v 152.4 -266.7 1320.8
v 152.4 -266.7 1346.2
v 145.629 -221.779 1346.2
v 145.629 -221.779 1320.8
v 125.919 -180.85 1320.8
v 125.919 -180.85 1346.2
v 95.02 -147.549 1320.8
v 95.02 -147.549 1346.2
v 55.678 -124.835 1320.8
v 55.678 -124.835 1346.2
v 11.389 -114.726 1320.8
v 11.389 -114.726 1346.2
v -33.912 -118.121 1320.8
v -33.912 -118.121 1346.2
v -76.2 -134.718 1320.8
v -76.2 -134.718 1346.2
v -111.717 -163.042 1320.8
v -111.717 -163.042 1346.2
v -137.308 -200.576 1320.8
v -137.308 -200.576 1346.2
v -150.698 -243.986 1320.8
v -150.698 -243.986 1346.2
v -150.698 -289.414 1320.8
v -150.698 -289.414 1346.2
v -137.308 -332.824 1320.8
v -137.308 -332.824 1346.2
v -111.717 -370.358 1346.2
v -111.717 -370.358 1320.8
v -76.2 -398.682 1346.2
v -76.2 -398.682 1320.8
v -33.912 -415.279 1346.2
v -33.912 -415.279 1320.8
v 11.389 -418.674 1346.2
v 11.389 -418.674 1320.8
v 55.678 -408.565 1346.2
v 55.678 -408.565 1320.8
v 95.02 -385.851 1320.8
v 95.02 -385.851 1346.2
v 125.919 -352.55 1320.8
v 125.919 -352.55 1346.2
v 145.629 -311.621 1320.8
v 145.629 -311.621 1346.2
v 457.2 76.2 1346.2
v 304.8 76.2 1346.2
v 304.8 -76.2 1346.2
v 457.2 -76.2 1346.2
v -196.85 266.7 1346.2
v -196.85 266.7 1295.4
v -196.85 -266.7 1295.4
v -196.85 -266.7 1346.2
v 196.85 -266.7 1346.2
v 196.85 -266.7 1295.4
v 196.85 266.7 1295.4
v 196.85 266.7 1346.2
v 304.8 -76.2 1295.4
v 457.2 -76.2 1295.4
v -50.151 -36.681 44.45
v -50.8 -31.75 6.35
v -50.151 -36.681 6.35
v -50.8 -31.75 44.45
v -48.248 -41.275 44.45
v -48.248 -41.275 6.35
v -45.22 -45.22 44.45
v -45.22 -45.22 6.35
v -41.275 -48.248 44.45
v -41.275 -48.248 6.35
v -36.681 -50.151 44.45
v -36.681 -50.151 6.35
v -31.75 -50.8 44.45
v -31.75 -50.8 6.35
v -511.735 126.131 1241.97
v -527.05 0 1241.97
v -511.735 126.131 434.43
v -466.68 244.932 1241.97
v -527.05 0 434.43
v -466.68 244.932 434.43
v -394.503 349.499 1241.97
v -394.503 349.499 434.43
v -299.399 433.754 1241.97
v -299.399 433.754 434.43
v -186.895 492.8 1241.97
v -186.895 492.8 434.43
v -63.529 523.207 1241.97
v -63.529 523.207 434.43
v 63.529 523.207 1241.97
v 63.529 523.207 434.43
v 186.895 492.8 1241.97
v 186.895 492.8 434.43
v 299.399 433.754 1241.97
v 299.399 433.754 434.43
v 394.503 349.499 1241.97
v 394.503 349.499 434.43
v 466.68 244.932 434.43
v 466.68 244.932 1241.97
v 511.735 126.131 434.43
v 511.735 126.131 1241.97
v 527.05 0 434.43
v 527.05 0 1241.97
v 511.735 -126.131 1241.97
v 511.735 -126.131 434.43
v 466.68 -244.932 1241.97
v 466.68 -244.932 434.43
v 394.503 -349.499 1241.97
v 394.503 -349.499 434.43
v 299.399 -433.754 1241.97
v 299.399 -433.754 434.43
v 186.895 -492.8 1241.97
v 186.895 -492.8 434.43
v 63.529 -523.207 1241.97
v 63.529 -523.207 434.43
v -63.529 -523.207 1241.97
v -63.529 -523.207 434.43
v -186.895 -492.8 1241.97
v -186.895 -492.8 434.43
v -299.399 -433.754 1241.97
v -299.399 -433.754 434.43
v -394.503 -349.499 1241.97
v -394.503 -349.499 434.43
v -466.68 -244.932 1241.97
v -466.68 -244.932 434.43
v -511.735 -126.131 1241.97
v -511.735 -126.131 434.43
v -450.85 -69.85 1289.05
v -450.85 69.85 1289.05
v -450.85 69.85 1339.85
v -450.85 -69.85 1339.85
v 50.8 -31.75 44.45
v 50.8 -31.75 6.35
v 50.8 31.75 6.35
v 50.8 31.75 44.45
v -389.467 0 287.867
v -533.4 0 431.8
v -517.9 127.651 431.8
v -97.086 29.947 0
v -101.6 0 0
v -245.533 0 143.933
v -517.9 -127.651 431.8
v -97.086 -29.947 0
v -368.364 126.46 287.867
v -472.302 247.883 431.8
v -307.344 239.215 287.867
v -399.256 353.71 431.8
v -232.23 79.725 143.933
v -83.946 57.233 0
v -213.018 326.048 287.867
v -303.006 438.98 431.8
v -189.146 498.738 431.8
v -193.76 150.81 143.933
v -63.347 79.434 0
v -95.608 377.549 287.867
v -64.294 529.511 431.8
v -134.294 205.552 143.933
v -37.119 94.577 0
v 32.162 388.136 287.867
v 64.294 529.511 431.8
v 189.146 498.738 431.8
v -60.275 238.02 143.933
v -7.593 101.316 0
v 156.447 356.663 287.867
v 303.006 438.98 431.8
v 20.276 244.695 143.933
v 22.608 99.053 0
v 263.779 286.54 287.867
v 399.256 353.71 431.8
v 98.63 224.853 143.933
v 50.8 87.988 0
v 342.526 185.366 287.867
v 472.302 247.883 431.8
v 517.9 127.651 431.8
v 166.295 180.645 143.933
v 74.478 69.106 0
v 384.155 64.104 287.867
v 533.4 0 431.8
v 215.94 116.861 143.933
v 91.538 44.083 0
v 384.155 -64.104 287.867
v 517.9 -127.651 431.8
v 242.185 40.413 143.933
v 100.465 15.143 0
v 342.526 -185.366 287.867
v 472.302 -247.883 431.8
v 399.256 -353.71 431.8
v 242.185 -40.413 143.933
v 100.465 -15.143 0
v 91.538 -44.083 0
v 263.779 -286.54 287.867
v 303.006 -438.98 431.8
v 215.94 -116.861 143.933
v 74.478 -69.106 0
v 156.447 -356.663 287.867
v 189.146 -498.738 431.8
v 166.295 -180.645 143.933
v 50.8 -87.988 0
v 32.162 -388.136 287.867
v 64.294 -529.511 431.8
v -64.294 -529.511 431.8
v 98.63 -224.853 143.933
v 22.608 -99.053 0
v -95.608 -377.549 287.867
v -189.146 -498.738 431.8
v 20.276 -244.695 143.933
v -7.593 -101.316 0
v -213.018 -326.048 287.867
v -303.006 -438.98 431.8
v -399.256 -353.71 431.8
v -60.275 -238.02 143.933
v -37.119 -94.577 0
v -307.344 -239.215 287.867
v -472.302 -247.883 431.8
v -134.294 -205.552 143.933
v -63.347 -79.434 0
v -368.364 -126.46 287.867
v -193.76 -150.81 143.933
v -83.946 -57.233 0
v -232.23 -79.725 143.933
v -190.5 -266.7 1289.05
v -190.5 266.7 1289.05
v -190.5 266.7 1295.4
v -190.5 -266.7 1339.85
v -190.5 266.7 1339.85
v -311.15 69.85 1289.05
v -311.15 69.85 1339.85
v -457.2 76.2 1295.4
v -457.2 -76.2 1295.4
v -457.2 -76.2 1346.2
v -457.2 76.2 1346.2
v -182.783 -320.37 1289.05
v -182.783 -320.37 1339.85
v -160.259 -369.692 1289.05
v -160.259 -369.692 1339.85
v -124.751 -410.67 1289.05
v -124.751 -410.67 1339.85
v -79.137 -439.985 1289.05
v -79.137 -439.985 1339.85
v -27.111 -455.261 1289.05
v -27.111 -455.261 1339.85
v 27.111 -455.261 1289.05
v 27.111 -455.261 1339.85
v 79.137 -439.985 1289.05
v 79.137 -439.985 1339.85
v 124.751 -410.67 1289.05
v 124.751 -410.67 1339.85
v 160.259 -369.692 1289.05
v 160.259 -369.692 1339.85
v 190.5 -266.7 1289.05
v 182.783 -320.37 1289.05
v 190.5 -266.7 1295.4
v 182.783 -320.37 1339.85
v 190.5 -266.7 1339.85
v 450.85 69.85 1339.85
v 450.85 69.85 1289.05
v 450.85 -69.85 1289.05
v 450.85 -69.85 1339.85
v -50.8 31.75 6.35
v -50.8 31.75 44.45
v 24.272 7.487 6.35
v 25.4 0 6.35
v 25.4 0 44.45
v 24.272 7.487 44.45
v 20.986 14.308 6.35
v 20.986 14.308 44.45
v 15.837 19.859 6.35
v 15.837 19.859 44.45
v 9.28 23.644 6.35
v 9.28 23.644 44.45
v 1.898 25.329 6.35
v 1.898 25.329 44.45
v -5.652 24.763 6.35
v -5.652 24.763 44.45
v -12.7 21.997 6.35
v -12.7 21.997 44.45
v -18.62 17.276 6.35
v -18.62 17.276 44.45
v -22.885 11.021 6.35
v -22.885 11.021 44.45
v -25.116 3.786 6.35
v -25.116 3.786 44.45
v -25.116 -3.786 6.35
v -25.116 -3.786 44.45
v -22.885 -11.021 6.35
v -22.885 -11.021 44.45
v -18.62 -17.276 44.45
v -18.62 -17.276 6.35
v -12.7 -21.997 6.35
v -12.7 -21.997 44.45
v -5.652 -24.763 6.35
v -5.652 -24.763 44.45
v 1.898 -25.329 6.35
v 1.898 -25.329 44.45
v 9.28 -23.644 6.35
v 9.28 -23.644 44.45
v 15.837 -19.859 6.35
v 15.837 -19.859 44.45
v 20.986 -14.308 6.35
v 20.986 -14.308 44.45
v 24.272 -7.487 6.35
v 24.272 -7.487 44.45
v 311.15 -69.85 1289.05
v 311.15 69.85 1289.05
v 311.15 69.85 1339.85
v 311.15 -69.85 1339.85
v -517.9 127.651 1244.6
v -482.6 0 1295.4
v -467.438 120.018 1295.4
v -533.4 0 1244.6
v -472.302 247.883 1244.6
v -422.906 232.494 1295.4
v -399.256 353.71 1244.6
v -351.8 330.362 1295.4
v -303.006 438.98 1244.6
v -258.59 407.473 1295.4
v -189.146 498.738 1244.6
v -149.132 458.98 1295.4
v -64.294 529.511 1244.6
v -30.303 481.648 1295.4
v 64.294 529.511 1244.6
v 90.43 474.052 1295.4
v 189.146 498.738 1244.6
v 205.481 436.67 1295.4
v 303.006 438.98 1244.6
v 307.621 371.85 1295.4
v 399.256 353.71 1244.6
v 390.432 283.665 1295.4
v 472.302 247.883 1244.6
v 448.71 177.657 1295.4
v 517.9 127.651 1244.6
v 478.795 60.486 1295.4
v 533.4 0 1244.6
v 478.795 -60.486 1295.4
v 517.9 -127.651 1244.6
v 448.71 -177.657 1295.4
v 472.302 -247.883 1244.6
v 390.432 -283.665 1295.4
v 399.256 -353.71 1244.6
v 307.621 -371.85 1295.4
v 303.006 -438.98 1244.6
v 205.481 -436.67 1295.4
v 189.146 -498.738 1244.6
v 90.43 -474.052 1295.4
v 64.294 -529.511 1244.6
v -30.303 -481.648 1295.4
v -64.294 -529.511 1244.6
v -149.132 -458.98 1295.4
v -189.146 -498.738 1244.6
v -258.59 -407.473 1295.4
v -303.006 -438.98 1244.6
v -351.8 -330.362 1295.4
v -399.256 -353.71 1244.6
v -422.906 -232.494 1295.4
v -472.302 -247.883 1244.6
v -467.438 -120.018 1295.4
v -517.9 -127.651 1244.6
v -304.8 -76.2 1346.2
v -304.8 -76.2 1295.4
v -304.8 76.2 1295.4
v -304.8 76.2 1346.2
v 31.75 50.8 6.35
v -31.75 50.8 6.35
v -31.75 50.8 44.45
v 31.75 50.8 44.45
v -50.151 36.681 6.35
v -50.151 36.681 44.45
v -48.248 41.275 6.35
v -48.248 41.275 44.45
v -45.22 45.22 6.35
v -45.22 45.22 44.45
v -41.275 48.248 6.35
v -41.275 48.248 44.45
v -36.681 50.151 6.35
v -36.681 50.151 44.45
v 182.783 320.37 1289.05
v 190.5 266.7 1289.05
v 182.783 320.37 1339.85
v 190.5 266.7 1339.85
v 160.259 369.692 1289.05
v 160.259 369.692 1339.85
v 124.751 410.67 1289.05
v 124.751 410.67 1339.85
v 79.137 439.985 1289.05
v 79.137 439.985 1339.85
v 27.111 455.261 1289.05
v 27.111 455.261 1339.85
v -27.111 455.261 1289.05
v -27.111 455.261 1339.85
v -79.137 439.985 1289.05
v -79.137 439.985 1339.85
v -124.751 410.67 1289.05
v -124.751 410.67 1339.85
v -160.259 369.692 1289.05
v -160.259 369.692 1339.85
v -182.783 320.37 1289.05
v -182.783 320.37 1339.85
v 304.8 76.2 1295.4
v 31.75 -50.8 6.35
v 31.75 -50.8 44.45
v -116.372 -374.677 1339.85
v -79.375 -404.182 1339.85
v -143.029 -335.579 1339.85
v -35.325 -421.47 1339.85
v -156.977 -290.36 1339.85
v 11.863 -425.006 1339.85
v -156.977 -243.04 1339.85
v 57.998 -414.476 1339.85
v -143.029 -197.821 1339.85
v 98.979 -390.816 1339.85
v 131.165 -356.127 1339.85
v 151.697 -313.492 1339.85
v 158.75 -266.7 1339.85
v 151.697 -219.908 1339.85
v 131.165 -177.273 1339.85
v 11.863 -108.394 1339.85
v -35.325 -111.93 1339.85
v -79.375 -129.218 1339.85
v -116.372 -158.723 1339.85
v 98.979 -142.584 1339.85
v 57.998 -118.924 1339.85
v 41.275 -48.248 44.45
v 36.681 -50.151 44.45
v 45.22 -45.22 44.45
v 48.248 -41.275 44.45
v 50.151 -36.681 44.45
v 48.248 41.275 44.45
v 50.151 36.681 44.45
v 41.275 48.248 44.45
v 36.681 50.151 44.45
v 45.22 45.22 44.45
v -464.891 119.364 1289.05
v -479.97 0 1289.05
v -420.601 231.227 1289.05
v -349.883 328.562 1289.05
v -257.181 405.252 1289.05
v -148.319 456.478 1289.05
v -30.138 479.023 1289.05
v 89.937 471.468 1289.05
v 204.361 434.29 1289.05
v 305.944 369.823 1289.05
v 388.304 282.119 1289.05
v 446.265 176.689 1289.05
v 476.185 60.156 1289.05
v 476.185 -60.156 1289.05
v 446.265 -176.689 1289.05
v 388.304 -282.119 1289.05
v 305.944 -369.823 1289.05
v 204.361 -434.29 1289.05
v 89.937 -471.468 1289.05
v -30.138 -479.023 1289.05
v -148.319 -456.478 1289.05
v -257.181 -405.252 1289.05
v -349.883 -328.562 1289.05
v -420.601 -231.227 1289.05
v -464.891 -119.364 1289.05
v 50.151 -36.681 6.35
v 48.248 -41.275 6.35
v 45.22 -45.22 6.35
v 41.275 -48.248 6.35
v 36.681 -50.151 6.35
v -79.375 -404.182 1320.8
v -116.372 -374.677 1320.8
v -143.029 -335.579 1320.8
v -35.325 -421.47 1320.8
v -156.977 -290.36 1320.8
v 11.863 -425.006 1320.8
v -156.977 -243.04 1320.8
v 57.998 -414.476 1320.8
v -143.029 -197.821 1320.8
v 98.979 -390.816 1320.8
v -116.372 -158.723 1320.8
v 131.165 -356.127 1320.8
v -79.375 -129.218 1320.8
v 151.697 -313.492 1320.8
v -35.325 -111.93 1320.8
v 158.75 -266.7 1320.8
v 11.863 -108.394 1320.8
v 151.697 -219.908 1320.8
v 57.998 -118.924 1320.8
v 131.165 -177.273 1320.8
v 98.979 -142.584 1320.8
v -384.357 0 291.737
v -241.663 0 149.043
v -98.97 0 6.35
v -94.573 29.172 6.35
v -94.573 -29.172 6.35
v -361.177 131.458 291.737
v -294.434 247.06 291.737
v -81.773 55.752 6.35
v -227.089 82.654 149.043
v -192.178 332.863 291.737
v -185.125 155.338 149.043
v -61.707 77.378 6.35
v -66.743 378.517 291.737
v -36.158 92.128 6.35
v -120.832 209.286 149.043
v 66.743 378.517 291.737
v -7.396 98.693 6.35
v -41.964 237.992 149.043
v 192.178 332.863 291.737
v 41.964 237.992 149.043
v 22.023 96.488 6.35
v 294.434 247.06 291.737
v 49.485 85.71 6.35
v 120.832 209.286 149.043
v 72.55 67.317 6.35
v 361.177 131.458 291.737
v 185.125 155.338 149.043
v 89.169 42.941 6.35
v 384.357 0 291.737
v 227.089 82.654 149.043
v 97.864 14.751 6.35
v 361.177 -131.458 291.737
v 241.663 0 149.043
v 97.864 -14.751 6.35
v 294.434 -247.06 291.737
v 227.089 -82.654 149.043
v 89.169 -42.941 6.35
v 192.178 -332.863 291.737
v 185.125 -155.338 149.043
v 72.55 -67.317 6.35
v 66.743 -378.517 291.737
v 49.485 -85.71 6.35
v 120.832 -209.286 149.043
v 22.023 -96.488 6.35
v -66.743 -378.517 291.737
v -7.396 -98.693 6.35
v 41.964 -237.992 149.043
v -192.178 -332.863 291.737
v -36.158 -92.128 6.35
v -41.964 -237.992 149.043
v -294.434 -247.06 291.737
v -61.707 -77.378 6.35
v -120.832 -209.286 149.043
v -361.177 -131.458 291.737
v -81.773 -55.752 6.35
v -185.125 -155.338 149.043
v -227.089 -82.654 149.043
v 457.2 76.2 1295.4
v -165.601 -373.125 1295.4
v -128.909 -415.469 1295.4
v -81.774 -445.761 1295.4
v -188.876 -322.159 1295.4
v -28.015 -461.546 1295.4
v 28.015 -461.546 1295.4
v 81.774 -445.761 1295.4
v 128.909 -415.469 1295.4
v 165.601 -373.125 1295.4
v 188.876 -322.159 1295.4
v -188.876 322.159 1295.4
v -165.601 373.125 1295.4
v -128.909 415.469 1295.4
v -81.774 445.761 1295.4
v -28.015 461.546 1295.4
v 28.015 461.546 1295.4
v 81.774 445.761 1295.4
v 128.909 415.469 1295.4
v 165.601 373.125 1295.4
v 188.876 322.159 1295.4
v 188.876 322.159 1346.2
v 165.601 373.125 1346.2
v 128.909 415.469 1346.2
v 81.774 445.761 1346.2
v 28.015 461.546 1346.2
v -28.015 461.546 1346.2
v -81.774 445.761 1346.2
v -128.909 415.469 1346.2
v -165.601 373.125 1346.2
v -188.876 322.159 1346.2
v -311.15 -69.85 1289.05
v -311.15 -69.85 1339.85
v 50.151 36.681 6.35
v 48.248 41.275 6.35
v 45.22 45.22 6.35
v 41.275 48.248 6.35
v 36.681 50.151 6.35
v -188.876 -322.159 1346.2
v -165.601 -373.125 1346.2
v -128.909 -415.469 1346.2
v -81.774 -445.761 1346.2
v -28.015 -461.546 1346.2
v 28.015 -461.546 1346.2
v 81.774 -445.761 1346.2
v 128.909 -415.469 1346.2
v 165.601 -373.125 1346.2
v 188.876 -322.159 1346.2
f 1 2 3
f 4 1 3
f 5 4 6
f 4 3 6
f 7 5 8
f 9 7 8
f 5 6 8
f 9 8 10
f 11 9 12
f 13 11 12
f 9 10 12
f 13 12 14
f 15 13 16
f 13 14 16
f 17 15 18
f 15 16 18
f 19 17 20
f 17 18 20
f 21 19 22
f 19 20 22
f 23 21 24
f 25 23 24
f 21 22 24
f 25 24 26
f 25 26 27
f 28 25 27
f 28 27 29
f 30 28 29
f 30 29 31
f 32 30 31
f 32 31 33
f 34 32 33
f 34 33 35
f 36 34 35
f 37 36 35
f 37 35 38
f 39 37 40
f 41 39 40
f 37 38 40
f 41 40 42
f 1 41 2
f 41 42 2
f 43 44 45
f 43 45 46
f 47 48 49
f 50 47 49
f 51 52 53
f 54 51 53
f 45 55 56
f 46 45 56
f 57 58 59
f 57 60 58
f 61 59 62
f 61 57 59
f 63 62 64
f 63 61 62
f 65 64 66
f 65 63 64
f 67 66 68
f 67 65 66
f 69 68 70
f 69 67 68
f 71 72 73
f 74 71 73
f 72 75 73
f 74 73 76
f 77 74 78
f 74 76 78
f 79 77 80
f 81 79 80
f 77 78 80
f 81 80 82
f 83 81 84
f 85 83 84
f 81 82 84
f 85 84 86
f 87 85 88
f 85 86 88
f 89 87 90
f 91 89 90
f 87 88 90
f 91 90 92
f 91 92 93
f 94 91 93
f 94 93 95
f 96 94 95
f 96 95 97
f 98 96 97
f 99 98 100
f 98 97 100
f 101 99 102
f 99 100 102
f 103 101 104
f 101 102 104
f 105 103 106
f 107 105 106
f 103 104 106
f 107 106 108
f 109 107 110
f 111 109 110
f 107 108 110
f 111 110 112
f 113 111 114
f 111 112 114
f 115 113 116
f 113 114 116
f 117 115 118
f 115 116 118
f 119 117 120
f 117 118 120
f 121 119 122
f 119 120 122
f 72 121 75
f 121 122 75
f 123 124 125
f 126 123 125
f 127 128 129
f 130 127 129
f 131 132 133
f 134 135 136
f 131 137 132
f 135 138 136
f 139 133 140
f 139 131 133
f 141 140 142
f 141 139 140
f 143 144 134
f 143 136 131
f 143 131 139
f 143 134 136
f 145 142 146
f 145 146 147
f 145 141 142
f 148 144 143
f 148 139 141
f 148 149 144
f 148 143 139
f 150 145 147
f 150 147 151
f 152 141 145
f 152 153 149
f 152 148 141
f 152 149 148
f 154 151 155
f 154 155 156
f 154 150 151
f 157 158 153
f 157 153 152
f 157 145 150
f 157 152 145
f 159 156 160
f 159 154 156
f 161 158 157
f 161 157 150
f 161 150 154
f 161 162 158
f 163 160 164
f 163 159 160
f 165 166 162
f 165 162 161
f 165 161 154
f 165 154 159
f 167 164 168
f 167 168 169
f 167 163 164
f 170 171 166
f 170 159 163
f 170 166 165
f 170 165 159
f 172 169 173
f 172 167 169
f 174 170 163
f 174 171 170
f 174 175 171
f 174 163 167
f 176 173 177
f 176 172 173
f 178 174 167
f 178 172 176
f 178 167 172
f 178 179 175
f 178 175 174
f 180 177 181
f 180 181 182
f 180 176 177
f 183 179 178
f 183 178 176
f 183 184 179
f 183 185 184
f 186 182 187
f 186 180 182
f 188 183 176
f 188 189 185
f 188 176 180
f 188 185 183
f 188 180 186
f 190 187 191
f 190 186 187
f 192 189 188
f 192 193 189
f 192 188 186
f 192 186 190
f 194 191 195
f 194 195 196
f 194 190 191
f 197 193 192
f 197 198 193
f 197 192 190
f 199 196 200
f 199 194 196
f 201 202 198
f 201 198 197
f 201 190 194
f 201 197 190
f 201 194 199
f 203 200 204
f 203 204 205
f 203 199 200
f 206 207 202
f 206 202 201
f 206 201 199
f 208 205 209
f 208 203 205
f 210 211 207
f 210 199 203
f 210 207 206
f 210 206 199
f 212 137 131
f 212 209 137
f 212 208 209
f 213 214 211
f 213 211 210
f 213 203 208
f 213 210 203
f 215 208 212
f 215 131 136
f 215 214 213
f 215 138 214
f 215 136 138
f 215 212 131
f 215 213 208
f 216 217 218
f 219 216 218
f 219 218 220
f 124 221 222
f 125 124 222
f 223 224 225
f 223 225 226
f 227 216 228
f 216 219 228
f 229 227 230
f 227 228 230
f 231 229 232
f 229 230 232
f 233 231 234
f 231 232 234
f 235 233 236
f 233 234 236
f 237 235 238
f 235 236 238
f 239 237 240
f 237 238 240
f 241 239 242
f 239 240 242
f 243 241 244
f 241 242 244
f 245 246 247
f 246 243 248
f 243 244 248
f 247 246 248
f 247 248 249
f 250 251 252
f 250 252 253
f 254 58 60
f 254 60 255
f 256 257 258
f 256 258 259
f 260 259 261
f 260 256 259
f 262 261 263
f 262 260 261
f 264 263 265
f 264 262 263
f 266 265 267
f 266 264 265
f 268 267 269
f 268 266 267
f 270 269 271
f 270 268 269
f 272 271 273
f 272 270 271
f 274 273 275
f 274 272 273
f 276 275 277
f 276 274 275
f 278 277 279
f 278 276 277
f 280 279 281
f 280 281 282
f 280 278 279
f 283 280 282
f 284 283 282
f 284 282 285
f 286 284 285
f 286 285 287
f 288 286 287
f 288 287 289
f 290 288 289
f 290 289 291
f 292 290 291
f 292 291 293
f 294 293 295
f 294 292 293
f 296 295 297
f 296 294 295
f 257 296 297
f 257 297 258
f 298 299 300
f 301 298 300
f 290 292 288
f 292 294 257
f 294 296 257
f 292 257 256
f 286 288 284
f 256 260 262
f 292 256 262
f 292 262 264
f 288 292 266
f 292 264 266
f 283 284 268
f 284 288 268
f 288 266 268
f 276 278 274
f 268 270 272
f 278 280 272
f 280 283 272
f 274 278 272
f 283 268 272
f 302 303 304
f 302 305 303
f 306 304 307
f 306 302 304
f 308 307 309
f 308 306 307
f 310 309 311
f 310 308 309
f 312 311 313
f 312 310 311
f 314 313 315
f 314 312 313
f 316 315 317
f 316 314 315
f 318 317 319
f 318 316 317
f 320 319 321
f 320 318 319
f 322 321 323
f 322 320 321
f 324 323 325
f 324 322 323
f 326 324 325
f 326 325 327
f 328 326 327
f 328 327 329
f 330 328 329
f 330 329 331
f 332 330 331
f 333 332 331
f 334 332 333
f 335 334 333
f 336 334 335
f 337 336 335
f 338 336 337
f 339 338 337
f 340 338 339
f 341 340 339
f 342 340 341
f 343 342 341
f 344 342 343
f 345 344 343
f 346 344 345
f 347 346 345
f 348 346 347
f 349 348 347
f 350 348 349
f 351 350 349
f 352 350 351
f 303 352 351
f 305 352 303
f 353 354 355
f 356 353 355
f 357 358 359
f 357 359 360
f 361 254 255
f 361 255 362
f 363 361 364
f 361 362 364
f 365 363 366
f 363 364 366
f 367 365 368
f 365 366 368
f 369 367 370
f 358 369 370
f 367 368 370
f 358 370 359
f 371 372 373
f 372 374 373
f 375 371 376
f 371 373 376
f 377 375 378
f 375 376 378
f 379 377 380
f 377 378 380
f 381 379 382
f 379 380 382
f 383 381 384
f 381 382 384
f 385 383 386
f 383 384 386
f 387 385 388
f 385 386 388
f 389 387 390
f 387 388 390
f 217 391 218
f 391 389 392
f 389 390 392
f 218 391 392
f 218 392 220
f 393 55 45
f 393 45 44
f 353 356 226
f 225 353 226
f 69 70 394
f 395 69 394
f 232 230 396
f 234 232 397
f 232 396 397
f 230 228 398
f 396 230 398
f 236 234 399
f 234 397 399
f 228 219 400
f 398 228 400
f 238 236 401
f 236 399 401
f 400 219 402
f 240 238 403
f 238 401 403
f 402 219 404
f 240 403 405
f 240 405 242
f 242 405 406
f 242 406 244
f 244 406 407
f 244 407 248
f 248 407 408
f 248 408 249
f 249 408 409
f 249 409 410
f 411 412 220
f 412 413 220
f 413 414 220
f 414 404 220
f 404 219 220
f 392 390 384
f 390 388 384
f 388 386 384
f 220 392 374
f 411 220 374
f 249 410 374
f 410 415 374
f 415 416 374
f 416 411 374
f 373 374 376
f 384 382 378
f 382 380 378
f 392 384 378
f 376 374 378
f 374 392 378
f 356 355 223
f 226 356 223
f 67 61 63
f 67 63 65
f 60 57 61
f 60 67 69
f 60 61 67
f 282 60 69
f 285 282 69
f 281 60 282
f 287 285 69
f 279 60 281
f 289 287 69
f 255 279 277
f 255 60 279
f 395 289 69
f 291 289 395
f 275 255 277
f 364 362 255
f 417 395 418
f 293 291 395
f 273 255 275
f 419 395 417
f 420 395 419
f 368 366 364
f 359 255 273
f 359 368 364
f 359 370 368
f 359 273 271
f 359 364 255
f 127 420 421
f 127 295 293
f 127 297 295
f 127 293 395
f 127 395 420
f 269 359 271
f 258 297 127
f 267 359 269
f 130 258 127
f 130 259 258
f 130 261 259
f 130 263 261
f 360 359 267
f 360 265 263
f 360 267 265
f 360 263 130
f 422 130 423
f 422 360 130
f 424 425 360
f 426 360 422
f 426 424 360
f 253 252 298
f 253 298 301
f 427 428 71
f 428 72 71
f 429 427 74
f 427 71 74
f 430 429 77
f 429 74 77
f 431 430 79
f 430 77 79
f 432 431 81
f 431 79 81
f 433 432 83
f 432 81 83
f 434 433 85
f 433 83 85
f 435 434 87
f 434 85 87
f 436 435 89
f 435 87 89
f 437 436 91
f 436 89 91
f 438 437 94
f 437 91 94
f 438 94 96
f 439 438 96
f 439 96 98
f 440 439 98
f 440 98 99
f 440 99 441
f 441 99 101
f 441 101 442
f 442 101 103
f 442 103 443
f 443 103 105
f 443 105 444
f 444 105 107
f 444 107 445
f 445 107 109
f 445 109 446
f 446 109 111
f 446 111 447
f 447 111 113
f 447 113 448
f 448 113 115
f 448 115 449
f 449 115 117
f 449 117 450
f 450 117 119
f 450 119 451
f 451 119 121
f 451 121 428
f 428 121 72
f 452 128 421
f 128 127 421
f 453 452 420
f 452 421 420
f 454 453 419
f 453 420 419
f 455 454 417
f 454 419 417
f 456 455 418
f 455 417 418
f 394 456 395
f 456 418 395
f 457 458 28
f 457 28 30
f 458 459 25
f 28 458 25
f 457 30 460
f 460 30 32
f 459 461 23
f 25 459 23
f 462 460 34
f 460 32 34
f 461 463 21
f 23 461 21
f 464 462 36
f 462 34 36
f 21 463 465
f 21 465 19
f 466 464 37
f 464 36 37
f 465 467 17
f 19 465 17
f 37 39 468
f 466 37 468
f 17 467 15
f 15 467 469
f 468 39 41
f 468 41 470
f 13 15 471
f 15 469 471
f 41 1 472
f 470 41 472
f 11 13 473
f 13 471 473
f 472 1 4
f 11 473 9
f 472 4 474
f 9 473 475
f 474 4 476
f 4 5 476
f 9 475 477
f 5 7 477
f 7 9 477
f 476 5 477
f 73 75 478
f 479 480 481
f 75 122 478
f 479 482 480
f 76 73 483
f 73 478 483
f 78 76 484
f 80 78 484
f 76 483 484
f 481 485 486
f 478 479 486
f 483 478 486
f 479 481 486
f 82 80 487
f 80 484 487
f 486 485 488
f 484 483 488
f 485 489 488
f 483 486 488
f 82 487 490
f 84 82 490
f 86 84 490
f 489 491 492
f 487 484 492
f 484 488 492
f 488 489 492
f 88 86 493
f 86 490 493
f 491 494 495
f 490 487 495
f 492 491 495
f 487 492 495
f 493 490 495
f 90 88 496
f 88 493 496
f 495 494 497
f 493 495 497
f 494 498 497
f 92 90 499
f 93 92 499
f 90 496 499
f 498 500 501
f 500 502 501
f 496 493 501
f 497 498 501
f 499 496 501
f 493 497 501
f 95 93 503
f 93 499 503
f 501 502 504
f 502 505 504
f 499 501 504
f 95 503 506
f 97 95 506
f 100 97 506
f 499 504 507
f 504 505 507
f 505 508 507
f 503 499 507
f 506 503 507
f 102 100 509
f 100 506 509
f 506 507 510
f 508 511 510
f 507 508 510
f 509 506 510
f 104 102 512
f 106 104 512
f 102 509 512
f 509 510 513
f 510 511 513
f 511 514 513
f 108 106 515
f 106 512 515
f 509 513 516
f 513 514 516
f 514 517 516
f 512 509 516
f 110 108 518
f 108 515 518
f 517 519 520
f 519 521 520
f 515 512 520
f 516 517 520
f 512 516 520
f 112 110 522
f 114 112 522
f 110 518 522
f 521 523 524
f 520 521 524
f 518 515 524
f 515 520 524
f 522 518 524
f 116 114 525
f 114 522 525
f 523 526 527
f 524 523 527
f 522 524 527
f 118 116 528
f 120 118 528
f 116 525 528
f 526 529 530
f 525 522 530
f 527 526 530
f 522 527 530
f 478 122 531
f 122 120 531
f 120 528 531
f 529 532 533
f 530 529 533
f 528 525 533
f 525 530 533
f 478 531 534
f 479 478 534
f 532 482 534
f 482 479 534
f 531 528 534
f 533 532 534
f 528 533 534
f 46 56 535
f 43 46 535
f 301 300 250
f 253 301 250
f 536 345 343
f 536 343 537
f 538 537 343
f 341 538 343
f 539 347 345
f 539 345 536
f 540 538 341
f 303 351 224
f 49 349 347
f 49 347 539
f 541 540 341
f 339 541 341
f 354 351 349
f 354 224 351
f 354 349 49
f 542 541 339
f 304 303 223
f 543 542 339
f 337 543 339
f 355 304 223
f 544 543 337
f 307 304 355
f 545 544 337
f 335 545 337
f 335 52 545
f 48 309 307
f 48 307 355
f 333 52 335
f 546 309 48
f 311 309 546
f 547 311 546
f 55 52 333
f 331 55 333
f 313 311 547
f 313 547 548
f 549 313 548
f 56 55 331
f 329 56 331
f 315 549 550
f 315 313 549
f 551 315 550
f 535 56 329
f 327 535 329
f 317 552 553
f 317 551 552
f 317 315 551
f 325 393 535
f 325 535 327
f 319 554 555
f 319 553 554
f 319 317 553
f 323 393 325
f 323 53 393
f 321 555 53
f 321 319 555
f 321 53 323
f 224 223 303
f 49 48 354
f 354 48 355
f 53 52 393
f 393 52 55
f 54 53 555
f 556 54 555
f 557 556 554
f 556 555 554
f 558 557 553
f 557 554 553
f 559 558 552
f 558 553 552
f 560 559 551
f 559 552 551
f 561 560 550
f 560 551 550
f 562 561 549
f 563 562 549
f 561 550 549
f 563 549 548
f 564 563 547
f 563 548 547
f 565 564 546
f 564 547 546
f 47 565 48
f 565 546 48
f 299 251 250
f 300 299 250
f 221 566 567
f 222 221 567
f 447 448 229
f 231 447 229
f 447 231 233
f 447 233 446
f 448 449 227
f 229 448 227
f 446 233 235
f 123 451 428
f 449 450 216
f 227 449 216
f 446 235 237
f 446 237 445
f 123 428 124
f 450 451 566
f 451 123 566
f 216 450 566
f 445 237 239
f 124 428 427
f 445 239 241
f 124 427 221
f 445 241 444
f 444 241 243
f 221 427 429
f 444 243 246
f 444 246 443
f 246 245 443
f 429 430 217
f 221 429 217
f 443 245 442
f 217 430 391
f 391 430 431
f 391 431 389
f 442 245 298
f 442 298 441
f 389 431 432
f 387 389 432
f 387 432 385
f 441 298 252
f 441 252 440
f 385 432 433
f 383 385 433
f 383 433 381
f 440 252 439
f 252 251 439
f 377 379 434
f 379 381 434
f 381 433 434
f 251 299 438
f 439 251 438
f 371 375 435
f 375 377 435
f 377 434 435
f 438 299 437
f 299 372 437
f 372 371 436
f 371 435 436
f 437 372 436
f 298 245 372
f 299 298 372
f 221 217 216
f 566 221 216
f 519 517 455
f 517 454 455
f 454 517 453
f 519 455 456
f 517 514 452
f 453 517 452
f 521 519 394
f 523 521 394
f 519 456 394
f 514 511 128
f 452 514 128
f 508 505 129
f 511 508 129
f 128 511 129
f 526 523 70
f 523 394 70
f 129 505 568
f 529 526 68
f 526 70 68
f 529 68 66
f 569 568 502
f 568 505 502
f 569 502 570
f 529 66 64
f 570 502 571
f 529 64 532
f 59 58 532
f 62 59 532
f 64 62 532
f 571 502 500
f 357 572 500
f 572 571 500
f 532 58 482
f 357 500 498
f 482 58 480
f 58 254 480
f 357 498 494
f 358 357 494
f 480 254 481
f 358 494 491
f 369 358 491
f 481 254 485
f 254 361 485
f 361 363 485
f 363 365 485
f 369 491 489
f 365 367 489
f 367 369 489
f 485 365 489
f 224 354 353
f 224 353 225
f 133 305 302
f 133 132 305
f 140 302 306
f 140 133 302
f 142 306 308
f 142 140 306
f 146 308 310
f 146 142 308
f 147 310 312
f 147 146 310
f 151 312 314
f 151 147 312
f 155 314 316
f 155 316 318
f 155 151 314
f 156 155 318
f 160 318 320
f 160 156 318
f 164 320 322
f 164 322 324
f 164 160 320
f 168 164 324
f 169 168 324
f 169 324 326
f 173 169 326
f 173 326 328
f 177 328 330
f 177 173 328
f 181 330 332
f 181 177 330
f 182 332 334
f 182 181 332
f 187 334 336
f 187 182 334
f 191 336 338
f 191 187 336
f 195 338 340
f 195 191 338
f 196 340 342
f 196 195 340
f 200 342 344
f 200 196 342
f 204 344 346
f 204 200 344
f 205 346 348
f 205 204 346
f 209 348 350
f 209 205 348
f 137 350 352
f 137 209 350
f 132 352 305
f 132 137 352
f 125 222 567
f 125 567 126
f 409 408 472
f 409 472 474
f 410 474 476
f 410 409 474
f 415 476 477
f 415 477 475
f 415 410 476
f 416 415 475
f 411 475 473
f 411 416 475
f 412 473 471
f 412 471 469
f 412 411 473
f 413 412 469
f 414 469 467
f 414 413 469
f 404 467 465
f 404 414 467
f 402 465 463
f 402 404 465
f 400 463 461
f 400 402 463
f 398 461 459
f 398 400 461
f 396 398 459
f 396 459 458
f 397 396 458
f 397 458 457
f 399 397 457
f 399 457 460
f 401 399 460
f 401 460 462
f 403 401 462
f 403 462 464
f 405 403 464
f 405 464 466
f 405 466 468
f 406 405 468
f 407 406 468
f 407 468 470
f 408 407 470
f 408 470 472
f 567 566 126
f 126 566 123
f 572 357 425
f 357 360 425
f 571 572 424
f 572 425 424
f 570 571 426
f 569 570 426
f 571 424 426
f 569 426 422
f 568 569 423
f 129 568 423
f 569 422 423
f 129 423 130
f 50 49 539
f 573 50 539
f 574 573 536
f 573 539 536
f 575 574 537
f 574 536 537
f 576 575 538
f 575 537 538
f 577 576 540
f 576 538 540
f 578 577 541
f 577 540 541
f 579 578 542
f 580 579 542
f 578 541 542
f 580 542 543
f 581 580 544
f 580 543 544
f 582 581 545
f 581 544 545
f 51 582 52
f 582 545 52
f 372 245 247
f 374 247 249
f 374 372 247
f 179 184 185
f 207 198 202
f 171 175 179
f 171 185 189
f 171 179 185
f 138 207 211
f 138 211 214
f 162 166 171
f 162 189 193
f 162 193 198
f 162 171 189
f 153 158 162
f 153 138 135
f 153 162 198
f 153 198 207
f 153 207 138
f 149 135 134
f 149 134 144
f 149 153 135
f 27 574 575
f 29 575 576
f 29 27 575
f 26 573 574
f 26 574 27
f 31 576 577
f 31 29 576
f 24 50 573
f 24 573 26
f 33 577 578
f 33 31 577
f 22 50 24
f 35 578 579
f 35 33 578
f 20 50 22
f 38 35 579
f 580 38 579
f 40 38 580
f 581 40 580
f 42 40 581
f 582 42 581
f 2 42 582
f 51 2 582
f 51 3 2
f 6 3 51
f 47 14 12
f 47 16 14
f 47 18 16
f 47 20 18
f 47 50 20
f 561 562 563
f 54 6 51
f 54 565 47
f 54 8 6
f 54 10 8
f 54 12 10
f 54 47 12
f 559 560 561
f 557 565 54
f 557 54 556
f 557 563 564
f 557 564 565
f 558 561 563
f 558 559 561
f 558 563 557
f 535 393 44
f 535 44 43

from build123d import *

# Parameters (mm, degrees)
F2_W         = 152.4
F2_H         = 152.4
F3_DEPTH     = 50.8
F5_DEPTH     = 50.8
F6_R         = 152.4
F7_DEPTH     = 25.4
F8_T         = 6.35
F8_T3_DEPTH  = 165.1
F8_T5_DEPTH  = 165.1
F8_T7_DEPTH  = 546.1
F8_T9_DEPTH  = 165.1
F8_T12_ANGLE = 180.000000001
F8_T14_ANGLE = 180.000000001
F9_W         = 101.6
F9_H         = 101.6
F9_R         = 25.4
F10_DEPTH    = 38.1
F11_R        = 19.05


# Not quite as in the source:
# - a pattern or mirror of a feature is missing from the dataset's text; its kind, count and spacing are read off the source's solid
# - a shell that OpenCascade refuses in one call is made with other operations: the cavity is built on its own and cut out


with BuildPart() as f1:
    # F0 (on Front) → F1 (revolve)
    with BuildSketch(Plane.XZ):
        Polygon((-101.6, 0), (0, 0), (0, 1295.4), (-482.6, 1295.4), (-533.4, 1244.6), (-533.4, 431.8), align=None)
    revolve(axis=Axis((0, 0, 647.7), (0, 0, -1)))

    # F2 (on face) → F3 (join)
    with BuildSketch(Plane.XY.offset(1295.4)):
        with Locations((381, 0)):
            Rectangle(F2_W, F2_H)
    f3 = extrude(amount=F3_DEPTH)

    # F3_copies: F3 across plane
    add(f3.mirror(Plane(origin=(0, 0, 0), x_dir=(0, 0, -1), z_dir=(-1, 0, 0))))

    # F4 (on face) → F5 (join)
    with BuildSketch(Plane.XY.offset(1295.4)):
        with BuildLine():
            ThreePointArc((0, 463.55), (-139.1939698766, 405.8939698766), (-196.85, 266.7))
            Line((-196.85, 266.7), (-196.85, -266.7))
            ThreePointArc((-196.85, -266.7), (-139.1939698766, -405.8939698766), (0, -463.55))
            ThreePointArc((0, -463.55), (139.1939698766, -405.8939698766), (196.85, -266.7))
            Line((196.85, -266.7), (196.85, 266.7))
            ThreePointArc((196.85, 266.7), (139.1939698766, 405.8939698766), (0, 463.55))
        make_face()
    extrude(amount=F5_DEPTH)

    # F6 (on face) → F7 (cut)
    with BuildSketch(Plane.XY.offset(1346.2)):
        with Locations((0, -266.7)):
            Circle(F6_R)
    extrude(amount=-F7_DEPTH, mode=Mode.SUBTRACT)

    # F8: shell of thickness 6.35, made by hand


with BuildPart() as f8_core1:
    # F8_t2: copy of F1
    add(f1.part)

    # the walls: a layer under each face that stays
    f8_faces = [f8_core1.faces().sort_by_distance(p)[0] for p in [
        (0, 0, 0),
        (317.5, 0, 215.9),
        (533.4, 0, 838.2),
        (508, 0, 1270),
        (-321.7333333333, -321.7333333333, 1295.4),
        (-457.2, 0, 1320.8),
        (-381, -76.2, 1320.8),
        (-381, 76.2, 1320.8),
        (-304.8, 0, 1320.8),
        (0, 463.55, 1320.8),
        (-196.85, 0, 1320.8),
        (0, -463.55, 1320.8),
        (196.85, 0, 1320.8),
        (381, 76.2, 1320.8),
        (457.2, 0, 1320.8),
        (304.8, 0, 1320.8),
        (381, -76.2, 1320.8),
        (-381, 0, 1346.2),
        (0, 0, 1346.2),
        (381, 0, 1346.2),
        (-152.4, -266.7, 1333.5),
    ]]
    thicken(f8_faces, amount=-F8_T, mode=Mode.SUBTRACT)

    # F8_s4 → F8_t3 (cut)
    with BuildSketch(Plane.XZ.offset(-82.55)):
        Polygon((-457.2635, 1295.4635), (-457.2, 1289.05), (-450.85, 1289.05), (-450.85, 1295.4), align=None)
        Polygon((-304.7365, 1295.4635), (-304.8, 1289.05), (-311.15, 1289.05), (-311.15, 1295.4), align=None)
        Polygon((457.2635, 1295.4635), (457.2, 1289.05), (450.85, 1289.05), (450.85, 1295.4), align=None)
        Polygon((304.7365, 1295.4635), (304.8, 1289.05), (311.15, 1289.05), (311.15, 1295.4), align=None)
    extrude(amount=F8_T3_DEPTH, mode=Mode.SUBTRACT)

    # F8_s6 → F8_t5 (cut)
    with BuildSketch(Plane.YZ.offset(-463.55)):
        Polygon((-76.2635, 1295.4635), (-76.2, 1289.05), (-69.85, 1289.05), (-69.85, 1295.4), align=None)
        Polygon((76.2635, 1295.4635), (76.2, 1289.05), (69.85, 1289.05), (69.85, 1295.4), align=None)
    extrude(amount=F8_T5_DEPTH, mode=Mode.SUBTRACT)

    # F8_s8 → F8_t7 (cut)
    with BuildSketch(Plane.XZ.offset(-273.05)):
        Polygon((-196.9135, 1295.4635), (-196.85, 1289.05), (-190.5, 1289.05), (-190.5, 1295.4), align=None)
        Polygon((196.9135, 1295.4635), (196.85, 1289.05), (190.5, 1289.05), (190.5, 1295.4), align=None)
    extrude(amount=F8_T7_DEPTH, mode=Mode.SUBTRACT)

    # F8_s10 → F8_t9 (cut)
    with BuildSketch(Plane.YZ.offset(298.45)):
        Polygon((76.2635, 1295.4635), (76.2, 1289.05), (69.85, 1289.05), (69.85, 1295.4), align=None)
        Polygon((-76.2635, 1295.4635), (-76.2, 1289.05), (-69.85, 1289.05), (-69.85, 1295.4), align=None)
    extrude(amount=F8_T9_DEPTH, mode=Mode.SUBTRACT)

    # F8_s11 → F8_t12 (revolve, cut)
    with BuildSketch(Plane.XZ.offset(-266.7)):
        Polygon((196.9135, 1295.4635), (196.85, 1289.05), (190.5, 1289.05), (190.5, 1295.4), align=None)
    revolve(axis=Axis((0, 266.7, 1295.4), (0, 0, 1)), revolution_arc=F8_T12_ANGLE, mode=Mode.SUBTRACT)

    # F8_s13 → F8_t14 (revolve, cut)
    with BuildSketch(Plane.XZ.offset(266.7)):
        Polygon((-196.9135, 1295.4635), (-196.85, 1289.05), (-190.5, 1289.05), (-190.5, 1295.4), align=None)
    revolve(axis=Axis((0, -266.7, 1295.4), (0, 0, 1)), revolution_arc=F8_T14_ANGLE, mode=Mode.SUBTRACT)


with BuildPart() as f1_1:
    add(f1.part)

    # what is left inside the walls is the cavity
    f8_cavity = [f8_core1.part.solids().sort_by_distance(p)[0] for p in [
        (526.9865, 0, 972.789915),
    ]]
    add(f8_cavity, mode=Mode.SUBTRACT)

    # F9 (on face) → F10 (join)
    with BuildSketch(Plane.XY.offset(6.35)):
        Rectangle(F9_W, F9_H)
        Circle(F9_R, mode=Mode.SUBTRACT)
    extrude(amount=F10_DEPTH)

    # F11
    f11_edges = [f1_1.edges().sort_by_distance(p)[0] for p in [
        (-50.8, -50.8, 25.4),
        (50.8, -50.8, 25.4),
        (50.8, 50.8, 25.4),
        (-50.8, 50.8, 25.4),
    ]]
    fillet(f11_edges, radius=F11_R)


solid = f1_1.part
